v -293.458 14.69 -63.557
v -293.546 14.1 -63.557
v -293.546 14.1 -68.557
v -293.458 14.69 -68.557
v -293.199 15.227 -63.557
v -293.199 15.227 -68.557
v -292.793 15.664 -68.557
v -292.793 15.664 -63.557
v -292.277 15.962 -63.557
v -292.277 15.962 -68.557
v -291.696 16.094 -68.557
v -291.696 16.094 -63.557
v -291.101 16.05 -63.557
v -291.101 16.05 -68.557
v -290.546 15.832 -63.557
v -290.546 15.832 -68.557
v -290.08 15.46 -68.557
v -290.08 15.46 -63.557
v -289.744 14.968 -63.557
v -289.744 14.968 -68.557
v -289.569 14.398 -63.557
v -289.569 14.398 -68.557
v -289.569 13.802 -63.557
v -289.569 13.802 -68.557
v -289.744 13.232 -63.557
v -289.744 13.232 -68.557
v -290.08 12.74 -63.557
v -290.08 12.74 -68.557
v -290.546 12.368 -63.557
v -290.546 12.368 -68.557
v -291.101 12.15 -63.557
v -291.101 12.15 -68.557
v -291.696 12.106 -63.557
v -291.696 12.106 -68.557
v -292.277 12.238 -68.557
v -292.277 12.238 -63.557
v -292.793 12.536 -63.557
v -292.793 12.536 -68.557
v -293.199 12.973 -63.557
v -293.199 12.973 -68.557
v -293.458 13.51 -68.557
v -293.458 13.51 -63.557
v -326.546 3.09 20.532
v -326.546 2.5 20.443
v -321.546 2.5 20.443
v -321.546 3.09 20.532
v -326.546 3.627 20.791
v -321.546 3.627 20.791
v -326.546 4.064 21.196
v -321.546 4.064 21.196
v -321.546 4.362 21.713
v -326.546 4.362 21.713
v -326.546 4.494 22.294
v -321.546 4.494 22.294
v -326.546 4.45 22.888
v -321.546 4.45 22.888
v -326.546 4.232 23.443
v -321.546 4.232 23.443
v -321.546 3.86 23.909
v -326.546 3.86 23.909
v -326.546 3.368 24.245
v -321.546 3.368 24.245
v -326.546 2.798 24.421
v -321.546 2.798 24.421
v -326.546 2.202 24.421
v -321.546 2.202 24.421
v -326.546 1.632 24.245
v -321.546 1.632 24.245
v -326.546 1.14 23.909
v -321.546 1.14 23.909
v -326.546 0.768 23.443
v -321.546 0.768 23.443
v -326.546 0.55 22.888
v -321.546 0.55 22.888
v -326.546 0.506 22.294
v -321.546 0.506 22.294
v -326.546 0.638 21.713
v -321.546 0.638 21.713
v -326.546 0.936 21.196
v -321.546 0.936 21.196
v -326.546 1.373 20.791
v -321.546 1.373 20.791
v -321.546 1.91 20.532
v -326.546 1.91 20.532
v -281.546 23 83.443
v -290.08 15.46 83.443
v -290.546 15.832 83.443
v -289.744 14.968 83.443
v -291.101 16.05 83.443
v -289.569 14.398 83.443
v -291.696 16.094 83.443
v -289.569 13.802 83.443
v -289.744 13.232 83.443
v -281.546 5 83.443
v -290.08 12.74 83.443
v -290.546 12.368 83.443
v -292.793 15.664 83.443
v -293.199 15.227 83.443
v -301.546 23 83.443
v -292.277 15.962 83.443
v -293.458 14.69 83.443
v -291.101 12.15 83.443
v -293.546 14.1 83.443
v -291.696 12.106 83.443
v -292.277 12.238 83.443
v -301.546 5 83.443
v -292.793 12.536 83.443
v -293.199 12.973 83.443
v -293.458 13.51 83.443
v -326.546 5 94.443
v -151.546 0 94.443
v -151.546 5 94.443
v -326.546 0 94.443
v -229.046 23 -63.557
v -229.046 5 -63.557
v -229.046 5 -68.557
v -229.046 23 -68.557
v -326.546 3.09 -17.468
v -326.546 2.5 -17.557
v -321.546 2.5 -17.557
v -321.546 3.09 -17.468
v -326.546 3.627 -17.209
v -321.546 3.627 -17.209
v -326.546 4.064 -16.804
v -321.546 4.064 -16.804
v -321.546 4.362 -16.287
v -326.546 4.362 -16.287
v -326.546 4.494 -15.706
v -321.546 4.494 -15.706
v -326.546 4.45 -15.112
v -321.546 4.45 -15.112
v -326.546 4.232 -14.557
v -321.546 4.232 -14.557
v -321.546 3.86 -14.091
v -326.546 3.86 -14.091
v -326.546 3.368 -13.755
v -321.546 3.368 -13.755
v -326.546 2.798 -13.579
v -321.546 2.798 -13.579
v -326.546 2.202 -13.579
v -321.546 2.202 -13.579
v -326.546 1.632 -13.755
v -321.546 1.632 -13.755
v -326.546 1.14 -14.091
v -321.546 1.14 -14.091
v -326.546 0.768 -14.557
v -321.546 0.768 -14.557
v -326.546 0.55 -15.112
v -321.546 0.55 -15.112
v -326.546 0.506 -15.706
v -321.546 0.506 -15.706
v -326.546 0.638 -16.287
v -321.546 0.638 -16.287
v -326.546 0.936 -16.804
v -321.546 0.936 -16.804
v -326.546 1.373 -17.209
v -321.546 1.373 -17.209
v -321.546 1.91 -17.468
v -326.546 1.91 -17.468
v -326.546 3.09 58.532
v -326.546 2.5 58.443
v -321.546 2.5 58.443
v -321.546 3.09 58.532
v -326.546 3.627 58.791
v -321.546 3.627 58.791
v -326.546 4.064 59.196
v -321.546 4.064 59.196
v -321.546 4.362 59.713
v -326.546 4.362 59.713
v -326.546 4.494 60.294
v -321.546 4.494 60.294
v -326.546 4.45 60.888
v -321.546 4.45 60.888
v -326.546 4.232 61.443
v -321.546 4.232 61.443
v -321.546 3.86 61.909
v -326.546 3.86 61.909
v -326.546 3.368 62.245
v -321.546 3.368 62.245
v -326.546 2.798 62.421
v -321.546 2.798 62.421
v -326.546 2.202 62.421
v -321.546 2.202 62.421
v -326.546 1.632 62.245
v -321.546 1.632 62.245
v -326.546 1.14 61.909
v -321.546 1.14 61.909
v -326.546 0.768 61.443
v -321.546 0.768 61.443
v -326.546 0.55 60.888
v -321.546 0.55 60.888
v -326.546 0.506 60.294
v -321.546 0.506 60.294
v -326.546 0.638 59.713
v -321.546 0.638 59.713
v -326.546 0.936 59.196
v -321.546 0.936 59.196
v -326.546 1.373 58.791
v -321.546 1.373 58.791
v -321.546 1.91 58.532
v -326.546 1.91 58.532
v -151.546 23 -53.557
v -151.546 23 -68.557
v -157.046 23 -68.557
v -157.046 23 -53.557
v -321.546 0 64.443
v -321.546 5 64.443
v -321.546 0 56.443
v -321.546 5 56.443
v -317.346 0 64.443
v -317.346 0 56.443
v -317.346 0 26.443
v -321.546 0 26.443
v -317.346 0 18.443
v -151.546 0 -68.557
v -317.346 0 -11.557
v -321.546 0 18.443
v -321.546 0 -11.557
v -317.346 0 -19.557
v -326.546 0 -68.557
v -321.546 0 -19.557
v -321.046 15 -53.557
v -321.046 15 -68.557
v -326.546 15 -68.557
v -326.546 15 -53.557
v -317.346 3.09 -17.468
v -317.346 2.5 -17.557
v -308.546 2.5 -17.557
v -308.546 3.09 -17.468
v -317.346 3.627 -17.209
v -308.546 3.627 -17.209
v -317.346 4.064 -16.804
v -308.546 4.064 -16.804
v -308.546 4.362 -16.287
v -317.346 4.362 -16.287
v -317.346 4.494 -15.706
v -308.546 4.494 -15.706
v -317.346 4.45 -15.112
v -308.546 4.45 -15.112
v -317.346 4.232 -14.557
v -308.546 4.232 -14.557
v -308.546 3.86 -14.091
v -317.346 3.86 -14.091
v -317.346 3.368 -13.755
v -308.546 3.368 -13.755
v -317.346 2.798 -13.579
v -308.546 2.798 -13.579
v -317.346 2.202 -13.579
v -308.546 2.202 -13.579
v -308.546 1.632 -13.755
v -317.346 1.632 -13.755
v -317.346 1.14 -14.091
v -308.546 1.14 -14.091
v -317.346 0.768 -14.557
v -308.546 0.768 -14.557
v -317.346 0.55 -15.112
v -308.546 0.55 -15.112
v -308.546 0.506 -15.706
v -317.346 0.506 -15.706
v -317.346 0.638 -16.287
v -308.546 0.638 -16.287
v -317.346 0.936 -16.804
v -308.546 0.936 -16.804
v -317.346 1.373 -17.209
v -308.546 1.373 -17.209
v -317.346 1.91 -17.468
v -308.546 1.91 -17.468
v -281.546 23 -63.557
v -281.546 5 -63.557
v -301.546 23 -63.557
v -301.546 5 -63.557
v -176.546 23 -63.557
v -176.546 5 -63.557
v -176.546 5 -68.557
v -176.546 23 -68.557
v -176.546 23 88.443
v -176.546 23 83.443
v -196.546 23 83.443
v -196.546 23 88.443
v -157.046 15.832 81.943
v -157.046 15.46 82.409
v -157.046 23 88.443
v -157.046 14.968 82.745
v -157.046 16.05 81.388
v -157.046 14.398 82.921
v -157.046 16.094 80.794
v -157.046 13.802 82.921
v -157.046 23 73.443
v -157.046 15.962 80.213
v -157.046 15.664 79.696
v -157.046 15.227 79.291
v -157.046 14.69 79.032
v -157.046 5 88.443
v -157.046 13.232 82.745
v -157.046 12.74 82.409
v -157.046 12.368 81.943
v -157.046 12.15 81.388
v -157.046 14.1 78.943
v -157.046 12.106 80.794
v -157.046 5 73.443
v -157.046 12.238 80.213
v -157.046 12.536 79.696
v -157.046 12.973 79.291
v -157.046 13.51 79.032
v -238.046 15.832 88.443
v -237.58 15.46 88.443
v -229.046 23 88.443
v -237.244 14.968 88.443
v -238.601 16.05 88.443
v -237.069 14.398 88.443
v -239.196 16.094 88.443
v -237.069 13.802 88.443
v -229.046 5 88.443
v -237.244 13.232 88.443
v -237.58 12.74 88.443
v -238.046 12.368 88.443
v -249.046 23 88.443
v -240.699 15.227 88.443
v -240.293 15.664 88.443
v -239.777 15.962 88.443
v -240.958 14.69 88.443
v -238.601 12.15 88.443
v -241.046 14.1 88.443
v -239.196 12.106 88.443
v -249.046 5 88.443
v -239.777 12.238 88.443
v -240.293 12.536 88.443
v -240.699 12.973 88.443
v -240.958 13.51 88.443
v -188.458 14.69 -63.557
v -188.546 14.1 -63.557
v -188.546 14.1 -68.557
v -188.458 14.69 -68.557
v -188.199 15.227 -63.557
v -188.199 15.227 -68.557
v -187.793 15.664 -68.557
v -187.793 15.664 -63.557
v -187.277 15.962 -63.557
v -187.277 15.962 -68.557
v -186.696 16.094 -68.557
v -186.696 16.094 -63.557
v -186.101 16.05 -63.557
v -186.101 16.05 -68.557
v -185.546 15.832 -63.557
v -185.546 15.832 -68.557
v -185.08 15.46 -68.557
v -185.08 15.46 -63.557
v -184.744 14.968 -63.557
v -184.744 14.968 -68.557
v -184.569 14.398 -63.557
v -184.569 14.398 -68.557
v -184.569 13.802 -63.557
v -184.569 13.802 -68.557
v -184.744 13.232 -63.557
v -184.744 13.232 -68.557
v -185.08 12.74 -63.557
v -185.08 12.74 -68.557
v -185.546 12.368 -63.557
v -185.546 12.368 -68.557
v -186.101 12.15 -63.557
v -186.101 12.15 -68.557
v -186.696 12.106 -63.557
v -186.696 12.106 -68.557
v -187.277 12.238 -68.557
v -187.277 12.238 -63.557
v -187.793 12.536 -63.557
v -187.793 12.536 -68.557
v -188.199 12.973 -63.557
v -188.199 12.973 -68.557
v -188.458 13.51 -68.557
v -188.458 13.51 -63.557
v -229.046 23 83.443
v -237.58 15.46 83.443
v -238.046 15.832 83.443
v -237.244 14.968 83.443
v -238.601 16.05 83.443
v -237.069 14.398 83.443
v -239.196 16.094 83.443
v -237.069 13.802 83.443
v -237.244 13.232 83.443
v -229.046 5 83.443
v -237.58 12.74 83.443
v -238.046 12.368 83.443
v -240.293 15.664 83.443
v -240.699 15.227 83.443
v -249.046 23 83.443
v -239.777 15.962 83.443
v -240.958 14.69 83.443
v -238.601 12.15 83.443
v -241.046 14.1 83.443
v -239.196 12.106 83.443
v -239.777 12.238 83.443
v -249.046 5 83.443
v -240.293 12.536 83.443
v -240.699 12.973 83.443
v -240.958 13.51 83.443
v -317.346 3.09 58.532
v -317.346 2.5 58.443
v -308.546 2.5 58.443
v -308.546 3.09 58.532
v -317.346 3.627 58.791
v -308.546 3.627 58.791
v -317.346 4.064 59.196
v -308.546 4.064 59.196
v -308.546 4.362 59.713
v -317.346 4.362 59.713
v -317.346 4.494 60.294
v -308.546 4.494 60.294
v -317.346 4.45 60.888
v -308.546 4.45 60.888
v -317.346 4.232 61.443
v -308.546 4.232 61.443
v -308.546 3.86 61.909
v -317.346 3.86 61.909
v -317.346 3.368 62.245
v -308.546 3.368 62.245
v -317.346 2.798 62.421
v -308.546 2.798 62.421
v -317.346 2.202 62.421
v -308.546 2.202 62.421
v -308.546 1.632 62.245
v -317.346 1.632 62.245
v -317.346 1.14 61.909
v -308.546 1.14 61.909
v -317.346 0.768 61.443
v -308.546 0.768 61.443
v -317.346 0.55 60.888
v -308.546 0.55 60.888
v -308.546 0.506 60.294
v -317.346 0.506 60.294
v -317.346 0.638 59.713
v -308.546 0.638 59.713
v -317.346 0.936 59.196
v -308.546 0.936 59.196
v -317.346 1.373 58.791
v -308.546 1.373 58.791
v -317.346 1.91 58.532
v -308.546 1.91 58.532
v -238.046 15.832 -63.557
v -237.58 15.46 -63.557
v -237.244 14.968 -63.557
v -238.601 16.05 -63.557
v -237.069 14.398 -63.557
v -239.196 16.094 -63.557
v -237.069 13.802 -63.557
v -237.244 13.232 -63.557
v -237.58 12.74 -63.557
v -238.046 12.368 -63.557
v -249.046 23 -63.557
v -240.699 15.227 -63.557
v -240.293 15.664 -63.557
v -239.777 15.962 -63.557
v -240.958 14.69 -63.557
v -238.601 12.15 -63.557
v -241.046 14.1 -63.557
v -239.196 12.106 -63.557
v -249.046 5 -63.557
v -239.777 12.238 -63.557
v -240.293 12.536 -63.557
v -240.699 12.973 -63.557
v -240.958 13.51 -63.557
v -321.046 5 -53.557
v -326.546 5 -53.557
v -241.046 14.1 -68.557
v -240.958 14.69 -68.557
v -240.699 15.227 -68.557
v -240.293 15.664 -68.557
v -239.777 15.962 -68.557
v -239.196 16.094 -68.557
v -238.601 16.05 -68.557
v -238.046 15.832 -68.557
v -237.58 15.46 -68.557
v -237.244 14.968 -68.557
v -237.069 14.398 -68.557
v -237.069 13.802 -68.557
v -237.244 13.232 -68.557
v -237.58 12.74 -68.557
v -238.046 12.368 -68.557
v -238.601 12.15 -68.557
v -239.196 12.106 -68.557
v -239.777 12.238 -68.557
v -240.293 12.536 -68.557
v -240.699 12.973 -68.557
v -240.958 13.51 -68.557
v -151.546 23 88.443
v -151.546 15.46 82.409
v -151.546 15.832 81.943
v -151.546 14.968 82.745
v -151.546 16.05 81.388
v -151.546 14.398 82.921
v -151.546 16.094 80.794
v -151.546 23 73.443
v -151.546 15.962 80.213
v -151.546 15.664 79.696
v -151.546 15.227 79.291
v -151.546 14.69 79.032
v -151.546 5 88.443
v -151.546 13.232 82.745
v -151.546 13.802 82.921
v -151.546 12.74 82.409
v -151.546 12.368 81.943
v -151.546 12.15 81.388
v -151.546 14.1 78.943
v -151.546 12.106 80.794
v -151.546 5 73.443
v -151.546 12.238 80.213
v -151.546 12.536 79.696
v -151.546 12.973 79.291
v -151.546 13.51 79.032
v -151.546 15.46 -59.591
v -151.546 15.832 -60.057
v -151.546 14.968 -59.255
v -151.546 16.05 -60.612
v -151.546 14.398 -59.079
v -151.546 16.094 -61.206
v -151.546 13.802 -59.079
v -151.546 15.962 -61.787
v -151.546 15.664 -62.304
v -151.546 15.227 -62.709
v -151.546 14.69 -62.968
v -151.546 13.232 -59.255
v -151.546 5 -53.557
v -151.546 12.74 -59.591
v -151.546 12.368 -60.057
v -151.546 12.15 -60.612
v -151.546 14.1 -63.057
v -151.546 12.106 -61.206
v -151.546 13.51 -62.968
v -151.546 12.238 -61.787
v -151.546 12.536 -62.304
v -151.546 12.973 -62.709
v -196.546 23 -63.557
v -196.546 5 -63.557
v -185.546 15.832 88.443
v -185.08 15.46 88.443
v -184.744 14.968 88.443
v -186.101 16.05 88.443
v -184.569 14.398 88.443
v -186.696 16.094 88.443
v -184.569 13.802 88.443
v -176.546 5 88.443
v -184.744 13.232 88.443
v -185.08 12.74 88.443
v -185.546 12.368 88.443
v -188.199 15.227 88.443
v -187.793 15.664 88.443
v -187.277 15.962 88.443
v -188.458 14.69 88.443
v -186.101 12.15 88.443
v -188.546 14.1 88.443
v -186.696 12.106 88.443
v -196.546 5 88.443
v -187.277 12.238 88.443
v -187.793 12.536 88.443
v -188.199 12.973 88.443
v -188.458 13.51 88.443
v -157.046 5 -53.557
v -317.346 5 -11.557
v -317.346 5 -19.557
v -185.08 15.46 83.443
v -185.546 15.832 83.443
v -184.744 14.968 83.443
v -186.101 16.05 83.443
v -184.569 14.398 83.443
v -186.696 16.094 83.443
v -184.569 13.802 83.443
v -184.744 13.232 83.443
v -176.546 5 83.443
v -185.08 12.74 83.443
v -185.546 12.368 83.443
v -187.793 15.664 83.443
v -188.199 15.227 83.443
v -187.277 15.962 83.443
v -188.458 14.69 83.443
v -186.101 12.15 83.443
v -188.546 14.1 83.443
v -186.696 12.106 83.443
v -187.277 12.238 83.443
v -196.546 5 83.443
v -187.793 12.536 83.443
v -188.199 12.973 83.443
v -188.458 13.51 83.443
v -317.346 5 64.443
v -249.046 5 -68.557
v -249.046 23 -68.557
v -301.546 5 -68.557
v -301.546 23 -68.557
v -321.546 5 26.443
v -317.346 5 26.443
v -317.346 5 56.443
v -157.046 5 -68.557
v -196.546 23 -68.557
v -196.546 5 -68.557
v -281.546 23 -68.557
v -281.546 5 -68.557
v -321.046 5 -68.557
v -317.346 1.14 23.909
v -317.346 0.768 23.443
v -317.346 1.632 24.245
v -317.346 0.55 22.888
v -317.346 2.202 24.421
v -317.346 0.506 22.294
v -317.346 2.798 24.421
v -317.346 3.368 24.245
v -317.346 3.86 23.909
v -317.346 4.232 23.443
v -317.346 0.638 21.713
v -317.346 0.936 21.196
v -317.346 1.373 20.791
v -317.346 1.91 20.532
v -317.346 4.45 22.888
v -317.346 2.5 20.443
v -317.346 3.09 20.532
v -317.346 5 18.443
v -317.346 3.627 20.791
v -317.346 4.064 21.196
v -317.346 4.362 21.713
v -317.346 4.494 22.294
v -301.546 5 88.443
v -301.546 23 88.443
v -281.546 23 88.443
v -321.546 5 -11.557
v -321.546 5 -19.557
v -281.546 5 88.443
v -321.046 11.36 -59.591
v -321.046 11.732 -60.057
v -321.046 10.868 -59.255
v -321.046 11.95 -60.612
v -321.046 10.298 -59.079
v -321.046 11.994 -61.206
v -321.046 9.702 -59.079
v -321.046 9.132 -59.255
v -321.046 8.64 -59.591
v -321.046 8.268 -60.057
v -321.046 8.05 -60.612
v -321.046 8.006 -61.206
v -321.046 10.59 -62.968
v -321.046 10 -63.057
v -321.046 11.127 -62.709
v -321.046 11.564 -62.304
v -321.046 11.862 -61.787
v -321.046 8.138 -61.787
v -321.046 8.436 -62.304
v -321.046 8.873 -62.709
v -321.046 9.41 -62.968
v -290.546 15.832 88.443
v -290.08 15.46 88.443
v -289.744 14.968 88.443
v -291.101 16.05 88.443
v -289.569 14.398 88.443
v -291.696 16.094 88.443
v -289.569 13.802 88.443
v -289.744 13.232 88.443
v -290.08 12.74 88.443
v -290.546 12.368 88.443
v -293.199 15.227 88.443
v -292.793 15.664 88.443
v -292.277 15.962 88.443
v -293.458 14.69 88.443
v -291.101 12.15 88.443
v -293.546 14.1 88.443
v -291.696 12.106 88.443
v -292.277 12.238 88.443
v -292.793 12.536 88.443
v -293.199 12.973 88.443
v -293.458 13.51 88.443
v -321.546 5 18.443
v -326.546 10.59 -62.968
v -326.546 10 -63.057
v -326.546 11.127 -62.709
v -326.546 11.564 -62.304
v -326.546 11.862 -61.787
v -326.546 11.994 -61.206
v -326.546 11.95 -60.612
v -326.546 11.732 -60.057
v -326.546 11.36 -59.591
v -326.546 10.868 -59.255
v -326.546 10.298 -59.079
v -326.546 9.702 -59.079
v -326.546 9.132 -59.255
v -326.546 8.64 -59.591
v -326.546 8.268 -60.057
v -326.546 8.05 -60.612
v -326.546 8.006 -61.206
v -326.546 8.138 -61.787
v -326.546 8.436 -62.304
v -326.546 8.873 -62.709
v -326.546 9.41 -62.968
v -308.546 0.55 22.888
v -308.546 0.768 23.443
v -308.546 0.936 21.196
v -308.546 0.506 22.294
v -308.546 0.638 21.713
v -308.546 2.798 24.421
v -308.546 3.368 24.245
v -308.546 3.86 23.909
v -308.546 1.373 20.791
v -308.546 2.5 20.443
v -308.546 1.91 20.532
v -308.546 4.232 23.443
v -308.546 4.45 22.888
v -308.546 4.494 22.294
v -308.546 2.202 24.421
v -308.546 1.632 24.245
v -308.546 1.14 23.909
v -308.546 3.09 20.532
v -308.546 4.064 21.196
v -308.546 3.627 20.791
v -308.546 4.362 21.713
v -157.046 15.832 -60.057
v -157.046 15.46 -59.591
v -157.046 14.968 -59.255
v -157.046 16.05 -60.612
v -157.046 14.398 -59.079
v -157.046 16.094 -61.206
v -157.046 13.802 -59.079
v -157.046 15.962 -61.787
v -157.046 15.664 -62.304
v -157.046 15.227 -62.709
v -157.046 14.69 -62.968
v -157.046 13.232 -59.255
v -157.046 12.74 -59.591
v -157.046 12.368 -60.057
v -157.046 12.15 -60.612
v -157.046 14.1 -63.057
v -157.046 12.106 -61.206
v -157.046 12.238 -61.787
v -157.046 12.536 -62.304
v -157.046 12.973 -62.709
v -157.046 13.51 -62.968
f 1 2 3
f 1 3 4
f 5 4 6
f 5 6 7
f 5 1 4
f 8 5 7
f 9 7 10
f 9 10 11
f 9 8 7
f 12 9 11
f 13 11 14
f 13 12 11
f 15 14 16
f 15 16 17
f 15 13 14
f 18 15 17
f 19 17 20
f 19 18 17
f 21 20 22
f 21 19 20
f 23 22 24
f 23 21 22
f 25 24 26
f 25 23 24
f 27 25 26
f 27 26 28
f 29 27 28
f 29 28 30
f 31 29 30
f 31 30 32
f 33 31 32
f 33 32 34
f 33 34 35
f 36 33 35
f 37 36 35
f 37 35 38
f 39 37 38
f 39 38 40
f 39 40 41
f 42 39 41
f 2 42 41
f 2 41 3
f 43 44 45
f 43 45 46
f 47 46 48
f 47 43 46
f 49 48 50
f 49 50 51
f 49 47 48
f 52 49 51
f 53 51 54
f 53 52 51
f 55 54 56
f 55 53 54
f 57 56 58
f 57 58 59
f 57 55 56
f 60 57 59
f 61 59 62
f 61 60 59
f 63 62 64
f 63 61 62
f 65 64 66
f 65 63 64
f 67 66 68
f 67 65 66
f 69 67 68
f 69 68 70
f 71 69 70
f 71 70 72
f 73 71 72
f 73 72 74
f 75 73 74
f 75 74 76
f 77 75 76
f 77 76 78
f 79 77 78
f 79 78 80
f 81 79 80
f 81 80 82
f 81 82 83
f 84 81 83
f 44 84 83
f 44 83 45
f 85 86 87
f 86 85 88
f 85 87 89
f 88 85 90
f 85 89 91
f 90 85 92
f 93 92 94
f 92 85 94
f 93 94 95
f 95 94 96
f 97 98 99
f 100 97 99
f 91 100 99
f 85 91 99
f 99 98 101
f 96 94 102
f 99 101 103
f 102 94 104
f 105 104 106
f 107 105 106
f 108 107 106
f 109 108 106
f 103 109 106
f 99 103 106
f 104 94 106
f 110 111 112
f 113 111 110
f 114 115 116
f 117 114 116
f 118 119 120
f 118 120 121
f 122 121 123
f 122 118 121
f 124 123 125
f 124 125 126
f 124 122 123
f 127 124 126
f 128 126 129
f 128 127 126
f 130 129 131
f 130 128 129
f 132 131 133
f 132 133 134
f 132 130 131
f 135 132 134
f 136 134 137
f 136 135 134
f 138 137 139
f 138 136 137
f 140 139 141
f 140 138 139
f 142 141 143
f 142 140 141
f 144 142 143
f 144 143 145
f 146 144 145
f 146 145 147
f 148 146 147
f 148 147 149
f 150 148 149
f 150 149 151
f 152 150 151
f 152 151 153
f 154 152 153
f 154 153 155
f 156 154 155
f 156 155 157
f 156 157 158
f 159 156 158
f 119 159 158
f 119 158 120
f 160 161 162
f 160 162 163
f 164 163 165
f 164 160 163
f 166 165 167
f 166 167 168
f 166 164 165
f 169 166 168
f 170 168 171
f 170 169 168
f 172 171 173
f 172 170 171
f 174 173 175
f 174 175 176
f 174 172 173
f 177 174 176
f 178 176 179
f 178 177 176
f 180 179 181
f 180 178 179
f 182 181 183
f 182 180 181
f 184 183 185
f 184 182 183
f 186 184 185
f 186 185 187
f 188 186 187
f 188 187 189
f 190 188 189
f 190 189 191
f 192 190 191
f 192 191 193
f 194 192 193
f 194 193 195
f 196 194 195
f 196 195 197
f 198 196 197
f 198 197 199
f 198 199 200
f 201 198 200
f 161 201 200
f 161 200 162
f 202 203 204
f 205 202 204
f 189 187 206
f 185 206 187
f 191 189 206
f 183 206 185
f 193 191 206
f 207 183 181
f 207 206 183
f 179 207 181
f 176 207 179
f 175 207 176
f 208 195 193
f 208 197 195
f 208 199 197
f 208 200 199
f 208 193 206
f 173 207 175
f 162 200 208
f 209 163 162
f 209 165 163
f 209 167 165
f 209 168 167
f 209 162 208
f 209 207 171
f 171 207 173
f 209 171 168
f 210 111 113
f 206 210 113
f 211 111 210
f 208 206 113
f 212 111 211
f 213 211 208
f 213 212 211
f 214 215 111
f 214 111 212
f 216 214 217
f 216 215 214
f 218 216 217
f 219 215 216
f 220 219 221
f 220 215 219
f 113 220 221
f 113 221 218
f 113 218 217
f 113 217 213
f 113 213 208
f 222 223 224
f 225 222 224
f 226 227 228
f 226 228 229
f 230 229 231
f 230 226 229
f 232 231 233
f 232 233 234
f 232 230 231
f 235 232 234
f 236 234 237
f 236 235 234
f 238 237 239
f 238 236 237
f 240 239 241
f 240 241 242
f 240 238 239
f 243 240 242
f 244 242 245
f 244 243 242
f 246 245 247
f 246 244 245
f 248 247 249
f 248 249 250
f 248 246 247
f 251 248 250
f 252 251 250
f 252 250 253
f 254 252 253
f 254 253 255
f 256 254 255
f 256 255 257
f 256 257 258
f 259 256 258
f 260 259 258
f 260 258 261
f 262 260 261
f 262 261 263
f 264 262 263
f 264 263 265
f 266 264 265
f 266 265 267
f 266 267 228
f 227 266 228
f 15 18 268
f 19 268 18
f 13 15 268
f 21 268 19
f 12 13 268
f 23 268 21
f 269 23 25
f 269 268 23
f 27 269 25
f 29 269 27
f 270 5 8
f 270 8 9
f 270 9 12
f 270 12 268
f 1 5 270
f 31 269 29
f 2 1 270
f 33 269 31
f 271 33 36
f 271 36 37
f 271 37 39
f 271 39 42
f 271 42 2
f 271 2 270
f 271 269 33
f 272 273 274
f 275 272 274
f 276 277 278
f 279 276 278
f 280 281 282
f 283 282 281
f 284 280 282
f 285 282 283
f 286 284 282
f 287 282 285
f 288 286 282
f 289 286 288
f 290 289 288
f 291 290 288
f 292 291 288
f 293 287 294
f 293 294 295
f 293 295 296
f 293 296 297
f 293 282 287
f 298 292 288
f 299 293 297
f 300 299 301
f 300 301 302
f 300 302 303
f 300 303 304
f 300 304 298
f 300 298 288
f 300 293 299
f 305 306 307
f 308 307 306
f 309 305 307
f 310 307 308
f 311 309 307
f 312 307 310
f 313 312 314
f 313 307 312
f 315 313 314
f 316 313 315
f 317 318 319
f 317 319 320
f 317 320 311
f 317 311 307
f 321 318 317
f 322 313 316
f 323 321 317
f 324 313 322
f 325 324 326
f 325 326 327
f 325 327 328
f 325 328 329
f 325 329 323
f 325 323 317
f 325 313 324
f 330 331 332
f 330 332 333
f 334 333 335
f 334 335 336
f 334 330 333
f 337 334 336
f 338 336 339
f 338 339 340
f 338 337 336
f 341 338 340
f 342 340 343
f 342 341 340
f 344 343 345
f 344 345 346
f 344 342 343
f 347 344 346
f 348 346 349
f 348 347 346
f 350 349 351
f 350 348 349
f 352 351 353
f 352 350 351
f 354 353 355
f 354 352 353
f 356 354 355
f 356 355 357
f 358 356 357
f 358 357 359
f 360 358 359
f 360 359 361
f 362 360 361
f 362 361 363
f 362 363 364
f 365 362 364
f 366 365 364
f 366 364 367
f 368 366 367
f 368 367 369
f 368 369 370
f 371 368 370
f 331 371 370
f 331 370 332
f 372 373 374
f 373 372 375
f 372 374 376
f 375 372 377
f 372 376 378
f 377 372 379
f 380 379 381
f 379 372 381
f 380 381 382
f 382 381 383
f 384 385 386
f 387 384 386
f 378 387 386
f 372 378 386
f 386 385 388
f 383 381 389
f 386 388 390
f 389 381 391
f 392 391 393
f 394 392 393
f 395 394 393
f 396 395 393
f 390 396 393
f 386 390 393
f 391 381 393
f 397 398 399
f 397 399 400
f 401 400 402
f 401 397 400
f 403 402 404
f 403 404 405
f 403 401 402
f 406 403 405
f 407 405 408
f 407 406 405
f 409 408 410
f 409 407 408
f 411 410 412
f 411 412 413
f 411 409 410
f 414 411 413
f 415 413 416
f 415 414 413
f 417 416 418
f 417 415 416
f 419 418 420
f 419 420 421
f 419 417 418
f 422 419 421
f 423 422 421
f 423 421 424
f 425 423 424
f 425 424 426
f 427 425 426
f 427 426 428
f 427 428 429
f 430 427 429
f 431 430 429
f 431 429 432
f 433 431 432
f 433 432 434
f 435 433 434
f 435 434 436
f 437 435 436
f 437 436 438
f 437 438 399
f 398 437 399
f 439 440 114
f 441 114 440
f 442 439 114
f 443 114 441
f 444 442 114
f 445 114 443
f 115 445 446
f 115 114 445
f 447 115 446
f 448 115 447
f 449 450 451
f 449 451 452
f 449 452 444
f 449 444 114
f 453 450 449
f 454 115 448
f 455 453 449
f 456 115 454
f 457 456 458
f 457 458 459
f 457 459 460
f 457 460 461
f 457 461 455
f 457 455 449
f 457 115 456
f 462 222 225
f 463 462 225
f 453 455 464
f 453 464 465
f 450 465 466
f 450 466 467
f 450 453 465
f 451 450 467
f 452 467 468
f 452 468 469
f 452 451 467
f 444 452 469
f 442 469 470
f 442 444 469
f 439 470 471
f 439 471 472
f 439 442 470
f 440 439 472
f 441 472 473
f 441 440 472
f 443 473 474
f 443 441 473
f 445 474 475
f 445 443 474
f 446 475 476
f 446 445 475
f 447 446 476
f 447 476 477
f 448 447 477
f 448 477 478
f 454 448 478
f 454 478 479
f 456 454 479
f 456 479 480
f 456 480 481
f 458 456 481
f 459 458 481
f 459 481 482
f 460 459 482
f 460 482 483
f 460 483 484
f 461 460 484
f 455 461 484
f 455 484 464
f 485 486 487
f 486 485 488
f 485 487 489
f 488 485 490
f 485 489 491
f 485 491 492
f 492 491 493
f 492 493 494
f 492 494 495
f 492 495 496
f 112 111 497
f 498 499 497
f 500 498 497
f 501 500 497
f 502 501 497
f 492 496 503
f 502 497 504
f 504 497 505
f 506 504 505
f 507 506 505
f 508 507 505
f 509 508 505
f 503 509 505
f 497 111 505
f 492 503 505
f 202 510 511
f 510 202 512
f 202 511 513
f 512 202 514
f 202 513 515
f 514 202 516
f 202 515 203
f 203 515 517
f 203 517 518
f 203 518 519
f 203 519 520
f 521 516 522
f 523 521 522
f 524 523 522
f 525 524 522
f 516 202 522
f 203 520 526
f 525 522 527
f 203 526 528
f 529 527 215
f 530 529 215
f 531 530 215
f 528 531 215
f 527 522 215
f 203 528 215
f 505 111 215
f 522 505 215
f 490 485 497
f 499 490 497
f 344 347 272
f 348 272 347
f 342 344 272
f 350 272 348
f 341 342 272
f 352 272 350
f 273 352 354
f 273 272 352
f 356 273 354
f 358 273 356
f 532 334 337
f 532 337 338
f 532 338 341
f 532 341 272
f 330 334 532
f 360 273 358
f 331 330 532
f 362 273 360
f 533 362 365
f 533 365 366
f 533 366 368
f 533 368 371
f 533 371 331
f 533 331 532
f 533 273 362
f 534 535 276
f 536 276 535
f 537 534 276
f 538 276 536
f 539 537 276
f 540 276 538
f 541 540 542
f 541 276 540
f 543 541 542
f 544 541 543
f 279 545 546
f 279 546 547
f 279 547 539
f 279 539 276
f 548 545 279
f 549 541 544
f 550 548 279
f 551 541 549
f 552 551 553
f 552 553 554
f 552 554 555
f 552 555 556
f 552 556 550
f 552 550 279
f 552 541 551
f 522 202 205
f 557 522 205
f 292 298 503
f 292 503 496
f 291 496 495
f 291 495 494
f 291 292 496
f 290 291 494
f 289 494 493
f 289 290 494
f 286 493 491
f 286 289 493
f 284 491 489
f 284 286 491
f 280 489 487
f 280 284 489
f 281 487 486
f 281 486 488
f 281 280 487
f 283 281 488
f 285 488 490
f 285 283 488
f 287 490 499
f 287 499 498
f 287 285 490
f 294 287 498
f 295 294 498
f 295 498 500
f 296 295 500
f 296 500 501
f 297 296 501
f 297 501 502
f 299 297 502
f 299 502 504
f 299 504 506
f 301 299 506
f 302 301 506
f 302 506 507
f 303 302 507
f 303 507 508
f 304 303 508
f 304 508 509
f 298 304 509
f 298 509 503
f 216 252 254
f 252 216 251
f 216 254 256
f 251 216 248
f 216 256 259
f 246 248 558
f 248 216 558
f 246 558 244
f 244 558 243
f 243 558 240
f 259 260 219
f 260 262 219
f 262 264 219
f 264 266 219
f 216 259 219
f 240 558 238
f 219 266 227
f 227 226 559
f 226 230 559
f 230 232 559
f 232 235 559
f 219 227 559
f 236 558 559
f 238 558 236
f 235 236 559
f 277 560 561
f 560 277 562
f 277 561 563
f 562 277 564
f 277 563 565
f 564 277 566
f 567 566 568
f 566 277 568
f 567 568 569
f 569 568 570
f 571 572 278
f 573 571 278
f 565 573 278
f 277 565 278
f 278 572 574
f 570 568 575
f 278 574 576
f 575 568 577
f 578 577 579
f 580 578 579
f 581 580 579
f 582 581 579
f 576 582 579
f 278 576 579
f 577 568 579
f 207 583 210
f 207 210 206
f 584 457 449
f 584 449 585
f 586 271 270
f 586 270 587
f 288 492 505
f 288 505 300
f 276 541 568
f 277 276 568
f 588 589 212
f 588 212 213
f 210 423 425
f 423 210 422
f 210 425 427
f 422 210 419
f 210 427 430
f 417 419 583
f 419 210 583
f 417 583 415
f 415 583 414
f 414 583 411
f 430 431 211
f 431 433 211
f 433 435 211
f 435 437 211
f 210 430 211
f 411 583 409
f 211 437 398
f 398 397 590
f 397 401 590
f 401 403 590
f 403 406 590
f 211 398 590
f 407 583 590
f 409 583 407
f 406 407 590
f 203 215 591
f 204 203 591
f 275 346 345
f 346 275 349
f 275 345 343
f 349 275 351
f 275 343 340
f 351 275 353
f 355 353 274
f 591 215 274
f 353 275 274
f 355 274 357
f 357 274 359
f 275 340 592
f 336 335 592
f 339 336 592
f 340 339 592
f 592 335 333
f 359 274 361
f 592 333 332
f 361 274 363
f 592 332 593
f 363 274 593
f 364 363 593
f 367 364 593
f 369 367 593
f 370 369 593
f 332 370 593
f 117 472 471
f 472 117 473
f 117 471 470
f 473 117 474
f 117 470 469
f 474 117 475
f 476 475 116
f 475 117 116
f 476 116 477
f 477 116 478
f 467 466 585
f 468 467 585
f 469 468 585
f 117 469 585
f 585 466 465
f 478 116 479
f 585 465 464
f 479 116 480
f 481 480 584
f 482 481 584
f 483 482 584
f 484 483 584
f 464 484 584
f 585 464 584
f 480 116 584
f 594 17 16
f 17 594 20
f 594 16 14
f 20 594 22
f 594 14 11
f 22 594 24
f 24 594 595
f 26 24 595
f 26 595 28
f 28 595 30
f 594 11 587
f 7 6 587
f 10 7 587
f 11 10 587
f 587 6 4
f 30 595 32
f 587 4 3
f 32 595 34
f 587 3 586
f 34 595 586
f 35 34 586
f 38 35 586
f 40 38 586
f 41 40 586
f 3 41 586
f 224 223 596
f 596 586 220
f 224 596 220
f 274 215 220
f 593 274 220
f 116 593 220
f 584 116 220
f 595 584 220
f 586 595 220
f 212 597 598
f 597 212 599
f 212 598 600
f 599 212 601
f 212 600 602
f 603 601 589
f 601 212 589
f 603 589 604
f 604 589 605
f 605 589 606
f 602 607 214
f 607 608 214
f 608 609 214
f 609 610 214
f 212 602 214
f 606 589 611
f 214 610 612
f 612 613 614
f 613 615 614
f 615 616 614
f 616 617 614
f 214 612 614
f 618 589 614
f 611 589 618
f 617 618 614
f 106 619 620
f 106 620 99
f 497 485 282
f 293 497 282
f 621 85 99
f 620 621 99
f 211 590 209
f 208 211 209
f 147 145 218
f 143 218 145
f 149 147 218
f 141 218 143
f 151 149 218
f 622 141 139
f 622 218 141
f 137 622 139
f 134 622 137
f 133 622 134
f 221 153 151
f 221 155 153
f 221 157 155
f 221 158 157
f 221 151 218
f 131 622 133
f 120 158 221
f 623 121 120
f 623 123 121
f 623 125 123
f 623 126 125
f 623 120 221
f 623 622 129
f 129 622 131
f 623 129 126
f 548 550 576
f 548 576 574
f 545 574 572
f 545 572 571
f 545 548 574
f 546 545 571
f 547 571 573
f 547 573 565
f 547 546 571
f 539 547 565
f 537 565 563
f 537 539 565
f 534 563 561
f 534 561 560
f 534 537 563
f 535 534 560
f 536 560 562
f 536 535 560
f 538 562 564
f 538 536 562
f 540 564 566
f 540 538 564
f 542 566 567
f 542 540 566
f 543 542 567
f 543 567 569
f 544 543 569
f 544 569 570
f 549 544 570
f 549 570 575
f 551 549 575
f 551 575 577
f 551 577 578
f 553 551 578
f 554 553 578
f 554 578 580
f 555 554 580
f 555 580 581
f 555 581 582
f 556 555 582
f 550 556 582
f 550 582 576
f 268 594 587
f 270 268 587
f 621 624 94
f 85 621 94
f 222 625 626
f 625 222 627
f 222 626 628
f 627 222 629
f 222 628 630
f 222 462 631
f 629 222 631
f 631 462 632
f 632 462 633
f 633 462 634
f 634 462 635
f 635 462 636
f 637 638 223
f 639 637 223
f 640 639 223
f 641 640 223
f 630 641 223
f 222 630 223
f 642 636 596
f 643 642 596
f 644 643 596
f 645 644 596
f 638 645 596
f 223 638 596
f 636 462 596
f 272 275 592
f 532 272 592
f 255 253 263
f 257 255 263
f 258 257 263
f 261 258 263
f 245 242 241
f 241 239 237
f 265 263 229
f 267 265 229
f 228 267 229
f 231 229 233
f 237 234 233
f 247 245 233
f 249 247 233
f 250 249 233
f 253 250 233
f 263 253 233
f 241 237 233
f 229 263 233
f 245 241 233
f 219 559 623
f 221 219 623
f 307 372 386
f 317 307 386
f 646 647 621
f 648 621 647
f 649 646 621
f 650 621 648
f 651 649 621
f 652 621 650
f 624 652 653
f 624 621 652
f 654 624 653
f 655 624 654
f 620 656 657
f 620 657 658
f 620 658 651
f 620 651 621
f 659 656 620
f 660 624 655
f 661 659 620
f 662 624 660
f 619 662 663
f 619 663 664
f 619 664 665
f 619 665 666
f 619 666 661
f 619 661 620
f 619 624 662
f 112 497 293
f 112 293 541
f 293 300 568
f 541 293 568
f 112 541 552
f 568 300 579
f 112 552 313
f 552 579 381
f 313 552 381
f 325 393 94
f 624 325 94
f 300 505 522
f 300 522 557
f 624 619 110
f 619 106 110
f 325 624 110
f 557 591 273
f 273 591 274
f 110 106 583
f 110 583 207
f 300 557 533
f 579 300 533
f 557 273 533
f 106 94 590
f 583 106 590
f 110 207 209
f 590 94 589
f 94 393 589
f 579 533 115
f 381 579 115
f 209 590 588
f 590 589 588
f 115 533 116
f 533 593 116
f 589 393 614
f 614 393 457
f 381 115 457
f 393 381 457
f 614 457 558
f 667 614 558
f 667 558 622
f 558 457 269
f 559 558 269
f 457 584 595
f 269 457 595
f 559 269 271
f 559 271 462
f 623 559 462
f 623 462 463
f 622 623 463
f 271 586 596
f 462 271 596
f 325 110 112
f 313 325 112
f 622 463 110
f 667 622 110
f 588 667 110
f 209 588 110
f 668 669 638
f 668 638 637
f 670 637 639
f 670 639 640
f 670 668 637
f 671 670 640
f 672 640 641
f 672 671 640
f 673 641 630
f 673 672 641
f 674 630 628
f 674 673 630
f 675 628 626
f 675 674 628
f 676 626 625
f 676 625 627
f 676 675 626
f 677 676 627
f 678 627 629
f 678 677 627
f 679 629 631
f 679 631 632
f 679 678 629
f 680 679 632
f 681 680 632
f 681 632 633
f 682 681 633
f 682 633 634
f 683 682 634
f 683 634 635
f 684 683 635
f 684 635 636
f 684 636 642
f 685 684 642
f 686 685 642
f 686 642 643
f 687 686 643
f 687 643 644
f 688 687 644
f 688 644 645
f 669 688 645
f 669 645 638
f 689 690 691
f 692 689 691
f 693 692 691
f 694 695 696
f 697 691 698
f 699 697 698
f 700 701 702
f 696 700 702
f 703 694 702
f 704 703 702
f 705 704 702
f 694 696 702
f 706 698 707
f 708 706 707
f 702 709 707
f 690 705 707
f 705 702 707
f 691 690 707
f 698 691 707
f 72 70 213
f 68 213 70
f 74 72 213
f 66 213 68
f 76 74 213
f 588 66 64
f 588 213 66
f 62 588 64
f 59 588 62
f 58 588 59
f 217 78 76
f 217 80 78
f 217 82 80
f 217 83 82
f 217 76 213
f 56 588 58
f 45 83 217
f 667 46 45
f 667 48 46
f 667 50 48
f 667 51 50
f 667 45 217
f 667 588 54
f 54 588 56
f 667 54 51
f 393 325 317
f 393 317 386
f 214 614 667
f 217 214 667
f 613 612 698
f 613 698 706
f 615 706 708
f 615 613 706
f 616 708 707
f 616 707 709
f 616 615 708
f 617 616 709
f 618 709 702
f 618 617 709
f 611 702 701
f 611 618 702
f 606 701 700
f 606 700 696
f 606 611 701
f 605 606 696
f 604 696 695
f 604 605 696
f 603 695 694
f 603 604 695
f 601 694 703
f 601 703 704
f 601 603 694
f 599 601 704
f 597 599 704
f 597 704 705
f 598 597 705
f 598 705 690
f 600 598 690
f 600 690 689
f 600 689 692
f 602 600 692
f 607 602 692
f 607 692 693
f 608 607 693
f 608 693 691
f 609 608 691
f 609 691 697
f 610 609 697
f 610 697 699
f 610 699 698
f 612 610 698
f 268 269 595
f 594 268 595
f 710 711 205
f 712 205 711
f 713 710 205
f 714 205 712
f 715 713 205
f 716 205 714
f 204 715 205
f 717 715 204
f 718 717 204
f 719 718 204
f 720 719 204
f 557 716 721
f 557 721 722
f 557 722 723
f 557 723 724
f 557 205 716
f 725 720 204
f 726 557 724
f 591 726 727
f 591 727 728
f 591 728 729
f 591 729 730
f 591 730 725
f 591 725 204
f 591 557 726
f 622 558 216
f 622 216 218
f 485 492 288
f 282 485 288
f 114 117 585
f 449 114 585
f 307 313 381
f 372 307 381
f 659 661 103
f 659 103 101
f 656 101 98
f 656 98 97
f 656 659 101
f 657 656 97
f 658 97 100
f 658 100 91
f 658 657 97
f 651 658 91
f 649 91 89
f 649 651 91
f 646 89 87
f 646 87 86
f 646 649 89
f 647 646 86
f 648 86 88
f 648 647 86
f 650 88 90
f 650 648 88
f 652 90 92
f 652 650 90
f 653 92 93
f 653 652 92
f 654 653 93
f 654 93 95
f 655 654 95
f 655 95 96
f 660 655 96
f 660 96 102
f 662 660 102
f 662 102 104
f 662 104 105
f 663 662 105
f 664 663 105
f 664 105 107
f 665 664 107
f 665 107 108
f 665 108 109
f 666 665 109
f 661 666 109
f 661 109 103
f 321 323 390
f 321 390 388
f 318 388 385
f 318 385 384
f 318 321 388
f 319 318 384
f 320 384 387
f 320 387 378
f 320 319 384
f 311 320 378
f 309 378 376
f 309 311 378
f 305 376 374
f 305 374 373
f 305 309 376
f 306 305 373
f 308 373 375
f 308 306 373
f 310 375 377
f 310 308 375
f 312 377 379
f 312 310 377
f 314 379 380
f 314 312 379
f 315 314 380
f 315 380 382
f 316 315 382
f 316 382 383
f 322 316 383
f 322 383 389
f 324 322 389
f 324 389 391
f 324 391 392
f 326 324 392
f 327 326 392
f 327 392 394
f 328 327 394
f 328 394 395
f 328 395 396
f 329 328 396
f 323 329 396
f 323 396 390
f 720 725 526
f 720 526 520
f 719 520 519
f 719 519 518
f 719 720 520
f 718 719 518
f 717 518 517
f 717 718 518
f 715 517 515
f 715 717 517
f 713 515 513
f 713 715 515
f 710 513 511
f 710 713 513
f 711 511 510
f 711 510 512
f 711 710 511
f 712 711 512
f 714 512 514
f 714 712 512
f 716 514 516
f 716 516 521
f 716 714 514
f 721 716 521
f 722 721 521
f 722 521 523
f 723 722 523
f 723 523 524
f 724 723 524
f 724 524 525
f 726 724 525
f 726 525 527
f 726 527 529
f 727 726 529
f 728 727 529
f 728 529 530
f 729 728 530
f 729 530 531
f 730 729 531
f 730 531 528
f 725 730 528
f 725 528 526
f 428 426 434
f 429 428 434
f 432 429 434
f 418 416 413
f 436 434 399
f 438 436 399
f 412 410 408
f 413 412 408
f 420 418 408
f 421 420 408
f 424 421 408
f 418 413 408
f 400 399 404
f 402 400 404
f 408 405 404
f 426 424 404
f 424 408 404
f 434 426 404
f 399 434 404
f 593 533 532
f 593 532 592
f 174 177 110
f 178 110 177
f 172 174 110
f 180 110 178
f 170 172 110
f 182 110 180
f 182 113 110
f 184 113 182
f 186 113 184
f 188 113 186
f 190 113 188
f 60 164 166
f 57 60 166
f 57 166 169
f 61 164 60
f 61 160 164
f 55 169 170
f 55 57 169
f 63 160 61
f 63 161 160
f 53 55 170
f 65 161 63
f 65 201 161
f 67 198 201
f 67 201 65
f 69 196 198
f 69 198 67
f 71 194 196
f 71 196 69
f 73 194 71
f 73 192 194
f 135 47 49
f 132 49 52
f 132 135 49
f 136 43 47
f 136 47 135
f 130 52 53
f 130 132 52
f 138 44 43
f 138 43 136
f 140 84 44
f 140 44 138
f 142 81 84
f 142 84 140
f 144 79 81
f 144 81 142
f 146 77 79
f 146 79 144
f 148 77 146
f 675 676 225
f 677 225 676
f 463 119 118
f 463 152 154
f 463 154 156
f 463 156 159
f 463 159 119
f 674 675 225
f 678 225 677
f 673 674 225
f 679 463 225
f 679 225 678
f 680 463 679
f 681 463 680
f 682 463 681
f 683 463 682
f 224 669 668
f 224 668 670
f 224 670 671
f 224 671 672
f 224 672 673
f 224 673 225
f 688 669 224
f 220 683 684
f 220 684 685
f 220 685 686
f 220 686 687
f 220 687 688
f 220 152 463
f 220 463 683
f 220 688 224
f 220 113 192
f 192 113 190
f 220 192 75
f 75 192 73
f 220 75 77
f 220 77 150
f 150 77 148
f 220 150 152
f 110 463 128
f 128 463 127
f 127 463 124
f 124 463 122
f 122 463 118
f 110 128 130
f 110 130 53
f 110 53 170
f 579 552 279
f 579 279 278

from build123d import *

# Parameters (mm, degrees)
SKETCH1_W               = 175
SKETCH1_H               = 163
BOSS_EXTRUDE1_DEPTH     = 5
SKETCH2_W               = 20
SKETCH2_H               = 5
BOSS_EXTRUDE2_DEPTH     = 18
SKETCH3_R               = 2
CUT_EXTRUDE1_DEPTH      = 7
CUT_EXTRUDE1_DEPTH_BACK = 158
SKETCH4_W               = 5.5
SKETCH4_H               = 15
BOSS_EXTRUDE3_DEPTH     = 18
SKETCH6_W               = 5.5
SKETCH6_H               = 15
BOSS_EXTRUDE4_DEPTH     = 10
SKETCH7_R               = 2
CUT_EXTRUDE3_DEPTH      = 10
SKETCH8_W               = 4.2
SKETCH8_H               = 8
CUT_EXTRUDE4_DEPTH      = 10
SKETCH9_R               = 2
CUT_EXTRUDE5_DEPTH      = 18
SKETCH5_R               = 2
CUT_EXTRUDE8_DEPTH      = 10


with BuildPart() as part:
    # Sketch1 → Boss-Extrude1 (new body)
    with BuildSketch(Plane(origin=(0, 0, 0), x_dir=(1, 0, 0), z_dir=(0, 1, 0))):
        with Locations((-64.046391753, -12.943298969)):
            Rectangle(SKETCH1_W, SKETCH1_H)
    extrude(amount=BOSS_EXTRUDE1_DEPTH)

    # Sketch2 → Boss-Extrude2 (add)
    with BuildSketch(Plane(origin=(0, 5, 0), x_dir=(1, 0, 0), z_dir=(0, 1, 0))):
        with Locations((-116.546391753, 66.056701031)):
            Rectangle(SKETCH2_W, SKETCH2_H)
        with Locations((-116.546391753, -85.943298969)):
            Rectangle(SKETCH2_W, SKETCH2_H)
        with Locations((-11.546391753, -85.943298969)):
            Rectangle(SKETCH2_W, SKETCH2_H)
        with Locations((-11.546391753, 66.056701031)):
            Rectangle(SKETCH2_W, SKETCH2_H)
        with Locations((-64.046391753, -85.943298969)):
            Rectangle(SKETCH2_W, SKETCH2_H)
        with Locations((-64.046391753, 66.056701031)):
            Rectangle(SKETCH2_W, SKETCH2_H)
    extrude(amount=BOSS_EXTRUDE2_DEPTH)

    # Sketch3 → Cut-Extrude1 (cut, two sides)
    with BuildSketch(Plane.XY.offset(88.443298969)) as cut_extrude1_sk:
        with Locations((-116.546391753, 14.1)):
            Circle(SKETCH3_R)
        with Locations((-64.046391753, 14.1)):
            Circle(SKETCH3_R)
        with Locations((-11.546391753, 14.1)):
            Circle(SKETCH3_R)
    extrude(amount=CUT_EXTRUDE1_DEPTH, mode=Mode.SUBTRACT)
    extrude(cut_extrude1_sk.sketch, amount=-CUT_EXTRUDE1_DEPTH_BACK, mode=Mode.SUBTRACT)

    # Sketch4 → Boss-Extrude3 (add)
    with BuildSketch(Plane(origin=(0, 5, 0), x_dir=(1, 0, 0), z_dir=(0, 1, 0))):
        with Locations((-148.796391753, 61.056701031)):
            Rectangle(SKETCH4_W, SKETCH4_H)
        with Locations((-148.796391753, -80.943298969)):
            Rectangle(SKETCH4_W, SKETCH4_H)
    extrude(amount=BOSS_EXTRUDE3_DEPTH)

    # Sketch6 → Boss-Extrude4 (add)
    with BuildSketch(Plane(origin=(0, 5, 0), x_dir=(1, 0, 0), z_dir=(0, 1, 0))):
        with Locations((20.703608247, 61.056701031)):
            Rectangle(SKETCH6_W, SKETCH6_H)
    extrude(amount=BOSS_EXTRUDE4_DEPTH)

    # Sketch7 → Cut-Extrude3 (cut)
    with BuildSketch(Plane(origin=(23.453608247, 0, 0), x_dir=(0, 0, -1), z_dir=(1, 0, 0))):
        with Locations((61.056701031, 10)):
            Circle(SKETCH7_R)
    extrude(amount=-CUT_EXTRUDE3_DEPTH, mode=Mode.SUBTRACT)

    # Sketch8 → Cut-Extrude4 (cut)
    with BuildSketch(Plane(origin=(0, 5, 0), x_dir=(1, 0, 0), z_dir=(0, 1, 0))):
        with Locations((16.353608247, -60.443298969)):
            Rectangle(SKETCH8_W, SKETCH8_H)
        with Locations((16.353608247, -22.443298969)):
            Rectangle(SKETCH8_W, SKETCH8_H)
        with Locations((16.353608247, 15.556701031)):
            Rectangle(SKETCH8_W, SKETCH8_H)
    extrude(amount=-CUT_EXTRUDE4_DEPTH, mode=Mode.SUBTRACT)

    # Sketch9 → Cut-Extrude5 (cut)
    with BuildSketch(Plane(origin=(23.453608247, 0, 0), x_dir=(0, 0, -1), z_dir=(1, 0, 0))):
        with Locations((-22.443298969, 2.5)):
            Circle(SKETCH9_R)
        with Locations((-60.443298969, 2.5)):
            Circle(SKETCH9_R)
        with Locations((15.556701031, 2.5)):
            Circle(SKETCH9_R)
    extrude(amount=-CUT_EXTRUDE5_DEPTH, mode=Mode.SUBTRACT)

    # Sketch5 → Cut-Extrude8 (cut)
    with BuildSketch(Plane(origin=(-146.046391753, 0, 0), x_dir=(0, 0, -1), z_dir=(1, 0, 0))):
        with Locations((61.056701031, 14.1)):
            Circle(SKETCH5_R)
        with Locations((-80.943298969, 14.1)):
            Circle(SKETCH5_R)
    extrude(amount=-CUT_EXTRUDE8_DEPTH, mode=Mode.SUBTRACT)


with BuildPart() as body_2:
    # Mirror3: mirrored copy
    add(part.part.mirror(Plane(origin=(-151.546391753, 5, -68.556701031), x_dir=(0, 0, 1), z_dir=(1, 0, 0))))


solid = body_2.part
